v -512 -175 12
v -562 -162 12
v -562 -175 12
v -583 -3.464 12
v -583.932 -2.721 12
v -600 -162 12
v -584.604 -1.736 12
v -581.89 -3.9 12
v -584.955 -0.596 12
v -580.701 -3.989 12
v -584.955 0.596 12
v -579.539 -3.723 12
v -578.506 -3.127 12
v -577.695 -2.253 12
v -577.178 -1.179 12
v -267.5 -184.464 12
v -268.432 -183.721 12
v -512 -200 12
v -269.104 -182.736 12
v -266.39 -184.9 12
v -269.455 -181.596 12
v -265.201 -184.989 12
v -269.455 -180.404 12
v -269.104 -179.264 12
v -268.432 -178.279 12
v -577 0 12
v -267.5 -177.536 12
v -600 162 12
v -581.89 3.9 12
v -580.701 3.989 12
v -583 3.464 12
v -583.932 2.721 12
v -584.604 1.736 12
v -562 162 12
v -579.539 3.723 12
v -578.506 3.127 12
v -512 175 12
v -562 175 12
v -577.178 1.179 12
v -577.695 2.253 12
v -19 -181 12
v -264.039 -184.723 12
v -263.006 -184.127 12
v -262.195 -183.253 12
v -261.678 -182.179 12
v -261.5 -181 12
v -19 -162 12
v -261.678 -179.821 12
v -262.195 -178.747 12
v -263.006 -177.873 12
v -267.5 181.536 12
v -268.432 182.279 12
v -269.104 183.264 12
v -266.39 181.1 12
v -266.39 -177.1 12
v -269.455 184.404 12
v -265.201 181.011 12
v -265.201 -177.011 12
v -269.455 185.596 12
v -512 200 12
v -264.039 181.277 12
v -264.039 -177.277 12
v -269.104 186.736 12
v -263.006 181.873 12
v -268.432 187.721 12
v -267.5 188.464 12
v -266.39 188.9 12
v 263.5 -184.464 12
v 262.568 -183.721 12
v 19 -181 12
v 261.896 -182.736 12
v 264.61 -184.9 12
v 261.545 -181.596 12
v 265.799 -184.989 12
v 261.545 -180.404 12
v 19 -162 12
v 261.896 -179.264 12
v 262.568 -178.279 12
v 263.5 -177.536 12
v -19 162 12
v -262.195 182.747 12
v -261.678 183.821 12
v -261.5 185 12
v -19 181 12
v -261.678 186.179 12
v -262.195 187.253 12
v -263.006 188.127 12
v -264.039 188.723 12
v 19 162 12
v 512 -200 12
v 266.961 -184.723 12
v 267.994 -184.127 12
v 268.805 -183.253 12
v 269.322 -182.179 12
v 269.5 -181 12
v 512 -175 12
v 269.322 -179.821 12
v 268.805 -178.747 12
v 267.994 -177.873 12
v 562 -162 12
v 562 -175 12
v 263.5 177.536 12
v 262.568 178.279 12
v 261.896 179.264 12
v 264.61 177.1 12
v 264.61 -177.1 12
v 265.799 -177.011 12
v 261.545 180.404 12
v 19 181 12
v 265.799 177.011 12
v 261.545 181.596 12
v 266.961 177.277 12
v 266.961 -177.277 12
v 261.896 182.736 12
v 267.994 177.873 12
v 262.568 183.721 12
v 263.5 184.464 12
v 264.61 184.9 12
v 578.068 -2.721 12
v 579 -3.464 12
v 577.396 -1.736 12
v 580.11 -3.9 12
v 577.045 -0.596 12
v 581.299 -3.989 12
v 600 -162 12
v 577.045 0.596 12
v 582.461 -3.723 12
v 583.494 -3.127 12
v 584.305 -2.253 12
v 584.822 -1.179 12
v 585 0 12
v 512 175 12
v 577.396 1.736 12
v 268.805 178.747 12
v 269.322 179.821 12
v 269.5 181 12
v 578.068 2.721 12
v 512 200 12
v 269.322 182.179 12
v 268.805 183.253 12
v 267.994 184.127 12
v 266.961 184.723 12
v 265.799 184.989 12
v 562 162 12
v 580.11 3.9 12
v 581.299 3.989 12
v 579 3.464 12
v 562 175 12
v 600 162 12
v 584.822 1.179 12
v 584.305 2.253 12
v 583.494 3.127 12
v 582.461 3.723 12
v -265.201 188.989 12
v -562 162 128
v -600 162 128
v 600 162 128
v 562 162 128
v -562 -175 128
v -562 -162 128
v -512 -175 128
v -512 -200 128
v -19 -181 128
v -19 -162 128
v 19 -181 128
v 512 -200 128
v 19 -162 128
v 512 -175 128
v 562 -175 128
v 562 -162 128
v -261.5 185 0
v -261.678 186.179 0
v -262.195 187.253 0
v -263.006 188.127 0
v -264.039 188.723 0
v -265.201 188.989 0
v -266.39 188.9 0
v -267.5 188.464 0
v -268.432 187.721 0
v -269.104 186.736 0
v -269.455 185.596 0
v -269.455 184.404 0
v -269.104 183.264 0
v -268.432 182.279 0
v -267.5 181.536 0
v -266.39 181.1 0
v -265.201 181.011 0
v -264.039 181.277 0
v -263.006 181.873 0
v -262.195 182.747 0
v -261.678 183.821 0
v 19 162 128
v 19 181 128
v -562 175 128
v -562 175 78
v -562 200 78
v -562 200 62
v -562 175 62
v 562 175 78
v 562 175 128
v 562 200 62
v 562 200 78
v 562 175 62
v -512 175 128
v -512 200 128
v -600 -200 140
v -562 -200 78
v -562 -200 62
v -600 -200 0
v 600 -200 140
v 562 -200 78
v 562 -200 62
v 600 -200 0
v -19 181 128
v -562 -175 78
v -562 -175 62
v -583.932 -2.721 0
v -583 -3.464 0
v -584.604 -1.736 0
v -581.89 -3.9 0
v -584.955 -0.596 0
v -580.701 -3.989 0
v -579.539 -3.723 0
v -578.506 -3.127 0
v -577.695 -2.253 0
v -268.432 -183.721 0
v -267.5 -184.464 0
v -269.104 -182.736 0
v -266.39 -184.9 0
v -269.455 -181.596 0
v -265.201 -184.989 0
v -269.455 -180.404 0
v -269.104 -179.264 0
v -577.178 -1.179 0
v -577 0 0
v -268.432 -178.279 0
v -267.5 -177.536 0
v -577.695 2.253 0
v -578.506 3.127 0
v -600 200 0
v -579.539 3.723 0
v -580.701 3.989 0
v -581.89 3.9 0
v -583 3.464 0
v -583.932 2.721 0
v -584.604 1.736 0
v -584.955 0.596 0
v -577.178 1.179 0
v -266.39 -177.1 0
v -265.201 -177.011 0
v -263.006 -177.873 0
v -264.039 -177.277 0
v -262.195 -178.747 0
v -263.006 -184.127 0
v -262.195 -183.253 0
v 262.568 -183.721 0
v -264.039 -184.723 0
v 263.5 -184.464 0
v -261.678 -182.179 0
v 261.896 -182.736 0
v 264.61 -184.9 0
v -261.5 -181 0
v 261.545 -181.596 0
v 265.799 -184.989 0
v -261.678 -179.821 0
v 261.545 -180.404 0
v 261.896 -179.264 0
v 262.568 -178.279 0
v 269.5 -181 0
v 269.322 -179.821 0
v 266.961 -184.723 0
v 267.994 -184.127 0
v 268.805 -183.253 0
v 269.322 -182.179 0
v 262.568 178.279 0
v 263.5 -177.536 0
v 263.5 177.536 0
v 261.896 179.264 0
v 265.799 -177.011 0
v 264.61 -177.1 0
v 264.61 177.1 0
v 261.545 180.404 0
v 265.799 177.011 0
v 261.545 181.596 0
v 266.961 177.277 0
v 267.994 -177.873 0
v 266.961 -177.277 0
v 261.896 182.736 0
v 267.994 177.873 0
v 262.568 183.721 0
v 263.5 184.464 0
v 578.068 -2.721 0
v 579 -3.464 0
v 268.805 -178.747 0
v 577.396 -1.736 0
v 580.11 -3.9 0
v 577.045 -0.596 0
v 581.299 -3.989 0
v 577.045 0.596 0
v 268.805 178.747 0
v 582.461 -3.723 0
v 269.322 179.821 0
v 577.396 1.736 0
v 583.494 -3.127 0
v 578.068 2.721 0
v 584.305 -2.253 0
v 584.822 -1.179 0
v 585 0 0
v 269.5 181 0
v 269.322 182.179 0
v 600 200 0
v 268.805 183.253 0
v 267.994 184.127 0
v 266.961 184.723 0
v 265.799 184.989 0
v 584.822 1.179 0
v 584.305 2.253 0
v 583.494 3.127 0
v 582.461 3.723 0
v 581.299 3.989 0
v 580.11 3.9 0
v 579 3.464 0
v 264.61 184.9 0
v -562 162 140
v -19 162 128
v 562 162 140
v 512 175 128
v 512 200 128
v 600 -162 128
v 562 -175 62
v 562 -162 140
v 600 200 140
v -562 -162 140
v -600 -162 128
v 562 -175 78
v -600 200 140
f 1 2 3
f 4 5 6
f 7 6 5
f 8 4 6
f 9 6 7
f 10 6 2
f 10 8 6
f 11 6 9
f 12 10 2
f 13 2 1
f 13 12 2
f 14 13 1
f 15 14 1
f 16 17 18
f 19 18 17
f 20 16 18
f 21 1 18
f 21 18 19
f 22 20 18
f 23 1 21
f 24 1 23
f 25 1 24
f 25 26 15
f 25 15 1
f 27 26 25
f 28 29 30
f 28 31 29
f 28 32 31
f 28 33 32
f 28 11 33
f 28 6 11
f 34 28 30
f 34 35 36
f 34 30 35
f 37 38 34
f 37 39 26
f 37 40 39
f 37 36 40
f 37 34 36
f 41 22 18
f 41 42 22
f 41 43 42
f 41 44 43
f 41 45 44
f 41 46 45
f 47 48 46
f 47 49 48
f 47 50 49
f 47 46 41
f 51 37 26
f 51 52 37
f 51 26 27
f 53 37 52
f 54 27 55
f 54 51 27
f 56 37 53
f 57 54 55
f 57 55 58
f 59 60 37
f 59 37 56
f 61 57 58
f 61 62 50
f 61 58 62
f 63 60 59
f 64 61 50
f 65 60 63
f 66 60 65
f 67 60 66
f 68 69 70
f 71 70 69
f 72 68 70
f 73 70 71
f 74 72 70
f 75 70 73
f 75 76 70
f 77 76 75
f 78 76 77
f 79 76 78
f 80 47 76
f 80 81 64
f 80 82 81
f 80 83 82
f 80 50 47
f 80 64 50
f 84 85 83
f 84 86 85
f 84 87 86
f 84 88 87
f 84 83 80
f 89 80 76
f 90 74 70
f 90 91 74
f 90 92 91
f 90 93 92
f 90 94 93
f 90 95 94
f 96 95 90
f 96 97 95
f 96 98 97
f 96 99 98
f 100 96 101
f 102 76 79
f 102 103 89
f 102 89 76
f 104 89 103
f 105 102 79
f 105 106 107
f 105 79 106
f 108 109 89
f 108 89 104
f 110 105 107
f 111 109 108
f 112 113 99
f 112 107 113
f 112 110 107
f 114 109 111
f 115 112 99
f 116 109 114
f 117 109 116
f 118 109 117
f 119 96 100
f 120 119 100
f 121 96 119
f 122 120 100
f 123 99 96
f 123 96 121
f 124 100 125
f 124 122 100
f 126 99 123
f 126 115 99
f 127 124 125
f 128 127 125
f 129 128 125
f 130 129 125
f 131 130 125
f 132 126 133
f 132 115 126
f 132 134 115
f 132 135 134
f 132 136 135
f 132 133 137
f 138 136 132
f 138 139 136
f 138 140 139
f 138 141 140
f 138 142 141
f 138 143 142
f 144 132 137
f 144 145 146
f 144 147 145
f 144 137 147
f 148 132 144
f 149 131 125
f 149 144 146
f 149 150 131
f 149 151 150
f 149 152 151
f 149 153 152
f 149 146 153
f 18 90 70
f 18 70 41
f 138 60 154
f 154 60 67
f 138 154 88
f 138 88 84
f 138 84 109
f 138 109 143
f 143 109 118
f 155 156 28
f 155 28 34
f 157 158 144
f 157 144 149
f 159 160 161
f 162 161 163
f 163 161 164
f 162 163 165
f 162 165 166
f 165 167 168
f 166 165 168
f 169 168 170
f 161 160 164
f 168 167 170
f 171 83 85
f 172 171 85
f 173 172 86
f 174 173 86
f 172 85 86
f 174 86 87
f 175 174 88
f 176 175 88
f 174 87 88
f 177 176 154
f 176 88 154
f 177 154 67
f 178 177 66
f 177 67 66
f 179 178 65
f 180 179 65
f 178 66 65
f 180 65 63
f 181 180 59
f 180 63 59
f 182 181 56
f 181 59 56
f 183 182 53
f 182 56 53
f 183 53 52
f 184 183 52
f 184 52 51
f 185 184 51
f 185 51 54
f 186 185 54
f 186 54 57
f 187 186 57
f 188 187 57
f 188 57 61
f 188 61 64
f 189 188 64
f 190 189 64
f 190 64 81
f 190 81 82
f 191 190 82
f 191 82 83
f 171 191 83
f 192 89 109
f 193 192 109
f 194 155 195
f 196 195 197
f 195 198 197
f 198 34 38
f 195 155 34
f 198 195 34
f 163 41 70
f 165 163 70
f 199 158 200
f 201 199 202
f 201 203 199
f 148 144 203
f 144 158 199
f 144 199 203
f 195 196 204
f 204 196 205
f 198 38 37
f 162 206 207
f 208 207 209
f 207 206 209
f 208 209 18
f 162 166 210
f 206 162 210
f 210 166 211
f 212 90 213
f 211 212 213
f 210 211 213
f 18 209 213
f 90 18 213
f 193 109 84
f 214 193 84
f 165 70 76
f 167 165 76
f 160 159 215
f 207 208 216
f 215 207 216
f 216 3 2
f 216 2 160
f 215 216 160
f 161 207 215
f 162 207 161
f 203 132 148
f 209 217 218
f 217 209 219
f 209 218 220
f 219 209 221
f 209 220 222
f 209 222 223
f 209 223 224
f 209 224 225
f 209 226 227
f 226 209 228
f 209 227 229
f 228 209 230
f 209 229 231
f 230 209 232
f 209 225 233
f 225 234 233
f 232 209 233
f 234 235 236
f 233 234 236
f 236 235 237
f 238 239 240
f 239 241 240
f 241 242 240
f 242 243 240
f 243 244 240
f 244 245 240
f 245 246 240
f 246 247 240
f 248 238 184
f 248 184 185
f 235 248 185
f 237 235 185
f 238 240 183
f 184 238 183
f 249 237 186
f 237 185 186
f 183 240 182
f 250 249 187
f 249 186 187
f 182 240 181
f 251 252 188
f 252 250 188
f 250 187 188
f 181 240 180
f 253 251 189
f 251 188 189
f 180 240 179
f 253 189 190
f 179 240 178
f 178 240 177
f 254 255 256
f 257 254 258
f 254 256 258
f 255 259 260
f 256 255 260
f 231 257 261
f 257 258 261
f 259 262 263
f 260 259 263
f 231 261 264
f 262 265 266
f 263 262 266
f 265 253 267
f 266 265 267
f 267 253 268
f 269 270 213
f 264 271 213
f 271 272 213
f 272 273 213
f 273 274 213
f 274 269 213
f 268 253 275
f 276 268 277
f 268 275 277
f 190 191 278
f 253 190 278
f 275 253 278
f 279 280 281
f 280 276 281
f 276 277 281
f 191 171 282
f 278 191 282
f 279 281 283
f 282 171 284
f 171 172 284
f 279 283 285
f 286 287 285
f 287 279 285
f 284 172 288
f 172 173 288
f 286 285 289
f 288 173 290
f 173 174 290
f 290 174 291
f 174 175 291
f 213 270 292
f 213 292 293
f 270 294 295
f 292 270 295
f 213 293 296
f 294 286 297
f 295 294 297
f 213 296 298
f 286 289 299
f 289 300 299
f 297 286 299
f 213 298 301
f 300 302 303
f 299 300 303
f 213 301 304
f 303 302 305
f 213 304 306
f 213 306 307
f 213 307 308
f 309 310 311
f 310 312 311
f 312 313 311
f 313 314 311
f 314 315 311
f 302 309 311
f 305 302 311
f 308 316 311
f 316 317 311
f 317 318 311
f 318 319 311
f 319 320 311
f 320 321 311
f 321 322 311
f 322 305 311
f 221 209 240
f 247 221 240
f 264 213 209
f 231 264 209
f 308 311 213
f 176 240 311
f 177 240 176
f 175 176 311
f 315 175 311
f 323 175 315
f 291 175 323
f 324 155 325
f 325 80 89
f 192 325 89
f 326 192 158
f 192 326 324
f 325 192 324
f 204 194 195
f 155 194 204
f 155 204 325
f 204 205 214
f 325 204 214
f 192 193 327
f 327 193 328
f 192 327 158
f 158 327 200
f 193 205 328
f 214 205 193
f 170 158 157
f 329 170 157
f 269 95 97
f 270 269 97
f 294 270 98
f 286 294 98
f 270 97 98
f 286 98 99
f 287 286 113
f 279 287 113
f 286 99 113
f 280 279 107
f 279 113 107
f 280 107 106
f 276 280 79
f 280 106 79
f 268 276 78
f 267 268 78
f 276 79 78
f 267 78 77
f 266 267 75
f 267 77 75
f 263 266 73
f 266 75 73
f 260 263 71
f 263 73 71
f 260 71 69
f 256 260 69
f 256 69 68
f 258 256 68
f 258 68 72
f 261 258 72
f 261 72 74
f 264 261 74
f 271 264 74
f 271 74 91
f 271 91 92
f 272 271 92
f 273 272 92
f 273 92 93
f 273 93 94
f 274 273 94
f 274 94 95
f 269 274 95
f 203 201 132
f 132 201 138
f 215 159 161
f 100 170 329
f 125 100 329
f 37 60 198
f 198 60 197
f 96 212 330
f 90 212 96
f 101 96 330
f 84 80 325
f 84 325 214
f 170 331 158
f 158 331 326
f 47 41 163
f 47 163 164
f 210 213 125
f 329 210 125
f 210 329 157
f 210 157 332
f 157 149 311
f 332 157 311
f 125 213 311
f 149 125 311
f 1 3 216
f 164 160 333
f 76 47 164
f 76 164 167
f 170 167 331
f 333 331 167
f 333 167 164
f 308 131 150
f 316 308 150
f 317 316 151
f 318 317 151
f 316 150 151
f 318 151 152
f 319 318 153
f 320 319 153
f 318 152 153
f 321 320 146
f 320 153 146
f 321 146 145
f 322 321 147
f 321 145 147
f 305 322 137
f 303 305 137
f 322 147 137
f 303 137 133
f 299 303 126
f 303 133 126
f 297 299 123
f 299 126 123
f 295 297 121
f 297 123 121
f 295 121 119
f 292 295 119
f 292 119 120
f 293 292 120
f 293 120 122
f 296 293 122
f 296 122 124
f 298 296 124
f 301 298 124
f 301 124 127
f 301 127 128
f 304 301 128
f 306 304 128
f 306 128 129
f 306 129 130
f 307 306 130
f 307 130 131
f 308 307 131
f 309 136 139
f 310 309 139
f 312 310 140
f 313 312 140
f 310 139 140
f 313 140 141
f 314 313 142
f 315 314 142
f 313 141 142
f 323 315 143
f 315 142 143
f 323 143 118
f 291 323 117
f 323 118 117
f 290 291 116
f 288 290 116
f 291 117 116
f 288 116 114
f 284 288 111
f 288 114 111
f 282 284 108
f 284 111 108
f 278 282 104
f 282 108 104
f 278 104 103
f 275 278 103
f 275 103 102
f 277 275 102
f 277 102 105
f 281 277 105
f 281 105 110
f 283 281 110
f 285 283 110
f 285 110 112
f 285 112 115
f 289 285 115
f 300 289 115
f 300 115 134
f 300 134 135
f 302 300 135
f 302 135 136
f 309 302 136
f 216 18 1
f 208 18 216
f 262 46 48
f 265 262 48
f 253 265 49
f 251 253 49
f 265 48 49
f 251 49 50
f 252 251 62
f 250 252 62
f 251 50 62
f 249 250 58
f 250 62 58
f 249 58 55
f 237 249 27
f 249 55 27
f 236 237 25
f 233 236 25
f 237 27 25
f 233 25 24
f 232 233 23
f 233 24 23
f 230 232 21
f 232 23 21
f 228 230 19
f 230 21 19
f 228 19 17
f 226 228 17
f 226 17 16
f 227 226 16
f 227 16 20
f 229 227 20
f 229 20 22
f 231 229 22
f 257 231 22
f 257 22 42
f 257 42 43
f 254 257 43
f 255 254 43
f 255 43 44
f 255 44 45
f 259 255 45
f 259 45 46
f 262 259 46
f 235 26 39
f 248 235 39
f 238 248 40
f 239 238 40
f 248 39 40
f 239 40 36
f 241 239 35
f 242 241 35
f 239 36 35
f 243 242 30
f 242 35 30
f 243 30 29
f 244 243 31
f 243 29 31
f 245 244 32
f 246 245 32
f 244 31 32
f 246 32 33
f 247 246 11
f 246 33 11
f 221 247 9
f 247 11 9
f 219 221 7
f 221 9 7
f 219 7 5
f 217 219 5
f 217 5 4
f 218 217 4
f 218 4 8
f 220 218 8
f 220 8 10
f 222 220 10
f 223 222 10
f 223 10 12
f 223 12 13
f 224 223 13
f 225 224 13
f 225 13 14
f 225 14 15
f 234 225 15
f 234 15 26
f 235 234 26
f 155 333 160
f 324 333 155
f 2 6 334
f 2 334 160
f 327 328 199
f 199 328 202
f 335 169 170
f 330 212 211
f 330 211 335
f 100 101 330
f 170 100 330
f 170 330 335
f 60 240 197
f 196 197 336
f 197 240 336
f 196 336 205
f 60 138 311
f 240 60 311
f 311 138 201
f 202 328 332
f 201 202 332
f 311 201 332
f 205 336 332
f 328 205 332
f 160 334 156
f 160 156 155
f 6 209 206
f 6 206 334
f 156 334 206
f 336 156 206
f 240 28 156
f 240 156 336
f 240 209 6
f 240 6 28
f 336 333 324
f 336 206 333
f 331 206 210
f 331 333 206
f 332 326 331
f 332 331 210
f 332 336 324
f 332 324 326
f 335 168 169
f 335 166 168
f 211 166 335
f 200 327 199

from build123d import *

# Parameters (mm, degrees)
F0_W      = 1200
F0_H      = 400
F1_DEPTH  = 12
F2_W      = 38
F2_H      = 38
F3_DEPTH  = 128
F5_DEPTH  = 12
F7_DEPTH  = 25
F9_W      = 38
F9_H      = 38
F10_DEPTH = 120
F11_R     = 4
F12_DEPTH = 25
F13_W     = 1124
F13_H     = 324
F14_DEPTH = 25
F15_W     = 38
F15_H     = 116
F16_DEPTH = 19
F17_W     = 38
F17_H     = 116
F18_DEPTH = 19


with BuildPart() as f1:
    # F0 (on Top) → F1 (new body)
    with BuildSketch(Plane.XY):
        Rectangle(F0_W, F0_H)
    extrude(amount=F1_DEPTH)

    # F2 (on face) → F3 (join)
    with BuildSketch(Plane.XY.offset(12)):
        with Locations((-581, 181)):
            Rectangle(F2_W, F2_H)
        with Locations((581, 181)):
            Rectangle(F2_W, F2_H)
        with Locations((581, -181)):
            Rectangle(F2_W, F2_H)
        with Locations((-581, -181)):
            Rectangle(F2_W, F2_H)
    extrude(amount=F3_DEPTH)

    # F4 (on face) → F5 (join)
    with BuildSketch(Plane.XY.offset(140)):
        Polygon((600, 200), (-562, 200), (-562, 162), (-600, 162), (-600, -200), (600, -200), align=None)
    extrude(amount=-F5_DEPTH)

    # F6 (on face) → F7 (join)
    with BuildSketch(Plane.XZ.offset(200)):
        Polygon((-562, 128), (-562, 78), (-512, 128), align=None)
        Polygon((-512, 12), (-562, 62), (-562, 12), align=None)
        Polygon((562, 62), (512, 12), (562, 12), align=None)
        Polygon((562, 128), (512, 128), (562, 78), align=None)
    extrude(amount=-F7_DEPTH)

    # F8: F1 across plane


with BuildPart() as f1_1:
    add(f1.part)
    add(f1.part.mirror(Plane.XZ))

    # F9 (on face) → F10 (join)
    with BuildSketch(Plane.XY.offset(12)):
        with Locations((0, -181)):
            Rectangle(F9_W, F9_H)
        with Locations((0, 181)):
            Rectangle(F9_W, F9_H)
    extrude(amount=F10_DEPTH)

    # F11 (on face) → F12 (cut)
    with BuildSketch(Plane.XY.offset(12)):
        with Locations((-265.5, -181)):
            Circle(F11_R)
        with Locations((-581, 0)):
            Circle(F11_R)
        with Locations((-265.5, 185)):
            Circle(F11_R)
        with Locations((265.5, 181)):
            Circle(F11_R)
        with Locations((265.5, -181)):
            Circle(F11_R)
        with Locations((581, 0)):
            Circle(F11_R)
    extrude(amount=-F12_DEPTH, mode=Mode.SUBTRACT)

    # F13 (on face) → F14 (cut)
    with BuildSketch(Plane.XY.offset(140)):
        Rectangle(F13_W, F13_H)
    extrude(amount=-F14_DEPTH, mode=Mode.SUBTRACT)

    # F15 (on face) → F16 (cut)
    with BuildSketch(Plane.XZ.offset(200)):
        with Locations((0, 70)):
            Rectangle(F15_W, F15_H)
    extrude(amount=-F16_DEPTH, mode=Mode.SUBTRACT)

    # F17 (on face) → F18 (cut)
    with BuildSketch(Plane(origin=(0, 200, 0), x_dir=(-1, 0, 0), z_dir=(0, 1, 0))):
        with Locations((0, 70)):
            Rectangle(F17_W, F17_H)
    extrude(amount=-F18_DEPTH, mode=Mode.SUBTRACT)


solid = f1_1.part
